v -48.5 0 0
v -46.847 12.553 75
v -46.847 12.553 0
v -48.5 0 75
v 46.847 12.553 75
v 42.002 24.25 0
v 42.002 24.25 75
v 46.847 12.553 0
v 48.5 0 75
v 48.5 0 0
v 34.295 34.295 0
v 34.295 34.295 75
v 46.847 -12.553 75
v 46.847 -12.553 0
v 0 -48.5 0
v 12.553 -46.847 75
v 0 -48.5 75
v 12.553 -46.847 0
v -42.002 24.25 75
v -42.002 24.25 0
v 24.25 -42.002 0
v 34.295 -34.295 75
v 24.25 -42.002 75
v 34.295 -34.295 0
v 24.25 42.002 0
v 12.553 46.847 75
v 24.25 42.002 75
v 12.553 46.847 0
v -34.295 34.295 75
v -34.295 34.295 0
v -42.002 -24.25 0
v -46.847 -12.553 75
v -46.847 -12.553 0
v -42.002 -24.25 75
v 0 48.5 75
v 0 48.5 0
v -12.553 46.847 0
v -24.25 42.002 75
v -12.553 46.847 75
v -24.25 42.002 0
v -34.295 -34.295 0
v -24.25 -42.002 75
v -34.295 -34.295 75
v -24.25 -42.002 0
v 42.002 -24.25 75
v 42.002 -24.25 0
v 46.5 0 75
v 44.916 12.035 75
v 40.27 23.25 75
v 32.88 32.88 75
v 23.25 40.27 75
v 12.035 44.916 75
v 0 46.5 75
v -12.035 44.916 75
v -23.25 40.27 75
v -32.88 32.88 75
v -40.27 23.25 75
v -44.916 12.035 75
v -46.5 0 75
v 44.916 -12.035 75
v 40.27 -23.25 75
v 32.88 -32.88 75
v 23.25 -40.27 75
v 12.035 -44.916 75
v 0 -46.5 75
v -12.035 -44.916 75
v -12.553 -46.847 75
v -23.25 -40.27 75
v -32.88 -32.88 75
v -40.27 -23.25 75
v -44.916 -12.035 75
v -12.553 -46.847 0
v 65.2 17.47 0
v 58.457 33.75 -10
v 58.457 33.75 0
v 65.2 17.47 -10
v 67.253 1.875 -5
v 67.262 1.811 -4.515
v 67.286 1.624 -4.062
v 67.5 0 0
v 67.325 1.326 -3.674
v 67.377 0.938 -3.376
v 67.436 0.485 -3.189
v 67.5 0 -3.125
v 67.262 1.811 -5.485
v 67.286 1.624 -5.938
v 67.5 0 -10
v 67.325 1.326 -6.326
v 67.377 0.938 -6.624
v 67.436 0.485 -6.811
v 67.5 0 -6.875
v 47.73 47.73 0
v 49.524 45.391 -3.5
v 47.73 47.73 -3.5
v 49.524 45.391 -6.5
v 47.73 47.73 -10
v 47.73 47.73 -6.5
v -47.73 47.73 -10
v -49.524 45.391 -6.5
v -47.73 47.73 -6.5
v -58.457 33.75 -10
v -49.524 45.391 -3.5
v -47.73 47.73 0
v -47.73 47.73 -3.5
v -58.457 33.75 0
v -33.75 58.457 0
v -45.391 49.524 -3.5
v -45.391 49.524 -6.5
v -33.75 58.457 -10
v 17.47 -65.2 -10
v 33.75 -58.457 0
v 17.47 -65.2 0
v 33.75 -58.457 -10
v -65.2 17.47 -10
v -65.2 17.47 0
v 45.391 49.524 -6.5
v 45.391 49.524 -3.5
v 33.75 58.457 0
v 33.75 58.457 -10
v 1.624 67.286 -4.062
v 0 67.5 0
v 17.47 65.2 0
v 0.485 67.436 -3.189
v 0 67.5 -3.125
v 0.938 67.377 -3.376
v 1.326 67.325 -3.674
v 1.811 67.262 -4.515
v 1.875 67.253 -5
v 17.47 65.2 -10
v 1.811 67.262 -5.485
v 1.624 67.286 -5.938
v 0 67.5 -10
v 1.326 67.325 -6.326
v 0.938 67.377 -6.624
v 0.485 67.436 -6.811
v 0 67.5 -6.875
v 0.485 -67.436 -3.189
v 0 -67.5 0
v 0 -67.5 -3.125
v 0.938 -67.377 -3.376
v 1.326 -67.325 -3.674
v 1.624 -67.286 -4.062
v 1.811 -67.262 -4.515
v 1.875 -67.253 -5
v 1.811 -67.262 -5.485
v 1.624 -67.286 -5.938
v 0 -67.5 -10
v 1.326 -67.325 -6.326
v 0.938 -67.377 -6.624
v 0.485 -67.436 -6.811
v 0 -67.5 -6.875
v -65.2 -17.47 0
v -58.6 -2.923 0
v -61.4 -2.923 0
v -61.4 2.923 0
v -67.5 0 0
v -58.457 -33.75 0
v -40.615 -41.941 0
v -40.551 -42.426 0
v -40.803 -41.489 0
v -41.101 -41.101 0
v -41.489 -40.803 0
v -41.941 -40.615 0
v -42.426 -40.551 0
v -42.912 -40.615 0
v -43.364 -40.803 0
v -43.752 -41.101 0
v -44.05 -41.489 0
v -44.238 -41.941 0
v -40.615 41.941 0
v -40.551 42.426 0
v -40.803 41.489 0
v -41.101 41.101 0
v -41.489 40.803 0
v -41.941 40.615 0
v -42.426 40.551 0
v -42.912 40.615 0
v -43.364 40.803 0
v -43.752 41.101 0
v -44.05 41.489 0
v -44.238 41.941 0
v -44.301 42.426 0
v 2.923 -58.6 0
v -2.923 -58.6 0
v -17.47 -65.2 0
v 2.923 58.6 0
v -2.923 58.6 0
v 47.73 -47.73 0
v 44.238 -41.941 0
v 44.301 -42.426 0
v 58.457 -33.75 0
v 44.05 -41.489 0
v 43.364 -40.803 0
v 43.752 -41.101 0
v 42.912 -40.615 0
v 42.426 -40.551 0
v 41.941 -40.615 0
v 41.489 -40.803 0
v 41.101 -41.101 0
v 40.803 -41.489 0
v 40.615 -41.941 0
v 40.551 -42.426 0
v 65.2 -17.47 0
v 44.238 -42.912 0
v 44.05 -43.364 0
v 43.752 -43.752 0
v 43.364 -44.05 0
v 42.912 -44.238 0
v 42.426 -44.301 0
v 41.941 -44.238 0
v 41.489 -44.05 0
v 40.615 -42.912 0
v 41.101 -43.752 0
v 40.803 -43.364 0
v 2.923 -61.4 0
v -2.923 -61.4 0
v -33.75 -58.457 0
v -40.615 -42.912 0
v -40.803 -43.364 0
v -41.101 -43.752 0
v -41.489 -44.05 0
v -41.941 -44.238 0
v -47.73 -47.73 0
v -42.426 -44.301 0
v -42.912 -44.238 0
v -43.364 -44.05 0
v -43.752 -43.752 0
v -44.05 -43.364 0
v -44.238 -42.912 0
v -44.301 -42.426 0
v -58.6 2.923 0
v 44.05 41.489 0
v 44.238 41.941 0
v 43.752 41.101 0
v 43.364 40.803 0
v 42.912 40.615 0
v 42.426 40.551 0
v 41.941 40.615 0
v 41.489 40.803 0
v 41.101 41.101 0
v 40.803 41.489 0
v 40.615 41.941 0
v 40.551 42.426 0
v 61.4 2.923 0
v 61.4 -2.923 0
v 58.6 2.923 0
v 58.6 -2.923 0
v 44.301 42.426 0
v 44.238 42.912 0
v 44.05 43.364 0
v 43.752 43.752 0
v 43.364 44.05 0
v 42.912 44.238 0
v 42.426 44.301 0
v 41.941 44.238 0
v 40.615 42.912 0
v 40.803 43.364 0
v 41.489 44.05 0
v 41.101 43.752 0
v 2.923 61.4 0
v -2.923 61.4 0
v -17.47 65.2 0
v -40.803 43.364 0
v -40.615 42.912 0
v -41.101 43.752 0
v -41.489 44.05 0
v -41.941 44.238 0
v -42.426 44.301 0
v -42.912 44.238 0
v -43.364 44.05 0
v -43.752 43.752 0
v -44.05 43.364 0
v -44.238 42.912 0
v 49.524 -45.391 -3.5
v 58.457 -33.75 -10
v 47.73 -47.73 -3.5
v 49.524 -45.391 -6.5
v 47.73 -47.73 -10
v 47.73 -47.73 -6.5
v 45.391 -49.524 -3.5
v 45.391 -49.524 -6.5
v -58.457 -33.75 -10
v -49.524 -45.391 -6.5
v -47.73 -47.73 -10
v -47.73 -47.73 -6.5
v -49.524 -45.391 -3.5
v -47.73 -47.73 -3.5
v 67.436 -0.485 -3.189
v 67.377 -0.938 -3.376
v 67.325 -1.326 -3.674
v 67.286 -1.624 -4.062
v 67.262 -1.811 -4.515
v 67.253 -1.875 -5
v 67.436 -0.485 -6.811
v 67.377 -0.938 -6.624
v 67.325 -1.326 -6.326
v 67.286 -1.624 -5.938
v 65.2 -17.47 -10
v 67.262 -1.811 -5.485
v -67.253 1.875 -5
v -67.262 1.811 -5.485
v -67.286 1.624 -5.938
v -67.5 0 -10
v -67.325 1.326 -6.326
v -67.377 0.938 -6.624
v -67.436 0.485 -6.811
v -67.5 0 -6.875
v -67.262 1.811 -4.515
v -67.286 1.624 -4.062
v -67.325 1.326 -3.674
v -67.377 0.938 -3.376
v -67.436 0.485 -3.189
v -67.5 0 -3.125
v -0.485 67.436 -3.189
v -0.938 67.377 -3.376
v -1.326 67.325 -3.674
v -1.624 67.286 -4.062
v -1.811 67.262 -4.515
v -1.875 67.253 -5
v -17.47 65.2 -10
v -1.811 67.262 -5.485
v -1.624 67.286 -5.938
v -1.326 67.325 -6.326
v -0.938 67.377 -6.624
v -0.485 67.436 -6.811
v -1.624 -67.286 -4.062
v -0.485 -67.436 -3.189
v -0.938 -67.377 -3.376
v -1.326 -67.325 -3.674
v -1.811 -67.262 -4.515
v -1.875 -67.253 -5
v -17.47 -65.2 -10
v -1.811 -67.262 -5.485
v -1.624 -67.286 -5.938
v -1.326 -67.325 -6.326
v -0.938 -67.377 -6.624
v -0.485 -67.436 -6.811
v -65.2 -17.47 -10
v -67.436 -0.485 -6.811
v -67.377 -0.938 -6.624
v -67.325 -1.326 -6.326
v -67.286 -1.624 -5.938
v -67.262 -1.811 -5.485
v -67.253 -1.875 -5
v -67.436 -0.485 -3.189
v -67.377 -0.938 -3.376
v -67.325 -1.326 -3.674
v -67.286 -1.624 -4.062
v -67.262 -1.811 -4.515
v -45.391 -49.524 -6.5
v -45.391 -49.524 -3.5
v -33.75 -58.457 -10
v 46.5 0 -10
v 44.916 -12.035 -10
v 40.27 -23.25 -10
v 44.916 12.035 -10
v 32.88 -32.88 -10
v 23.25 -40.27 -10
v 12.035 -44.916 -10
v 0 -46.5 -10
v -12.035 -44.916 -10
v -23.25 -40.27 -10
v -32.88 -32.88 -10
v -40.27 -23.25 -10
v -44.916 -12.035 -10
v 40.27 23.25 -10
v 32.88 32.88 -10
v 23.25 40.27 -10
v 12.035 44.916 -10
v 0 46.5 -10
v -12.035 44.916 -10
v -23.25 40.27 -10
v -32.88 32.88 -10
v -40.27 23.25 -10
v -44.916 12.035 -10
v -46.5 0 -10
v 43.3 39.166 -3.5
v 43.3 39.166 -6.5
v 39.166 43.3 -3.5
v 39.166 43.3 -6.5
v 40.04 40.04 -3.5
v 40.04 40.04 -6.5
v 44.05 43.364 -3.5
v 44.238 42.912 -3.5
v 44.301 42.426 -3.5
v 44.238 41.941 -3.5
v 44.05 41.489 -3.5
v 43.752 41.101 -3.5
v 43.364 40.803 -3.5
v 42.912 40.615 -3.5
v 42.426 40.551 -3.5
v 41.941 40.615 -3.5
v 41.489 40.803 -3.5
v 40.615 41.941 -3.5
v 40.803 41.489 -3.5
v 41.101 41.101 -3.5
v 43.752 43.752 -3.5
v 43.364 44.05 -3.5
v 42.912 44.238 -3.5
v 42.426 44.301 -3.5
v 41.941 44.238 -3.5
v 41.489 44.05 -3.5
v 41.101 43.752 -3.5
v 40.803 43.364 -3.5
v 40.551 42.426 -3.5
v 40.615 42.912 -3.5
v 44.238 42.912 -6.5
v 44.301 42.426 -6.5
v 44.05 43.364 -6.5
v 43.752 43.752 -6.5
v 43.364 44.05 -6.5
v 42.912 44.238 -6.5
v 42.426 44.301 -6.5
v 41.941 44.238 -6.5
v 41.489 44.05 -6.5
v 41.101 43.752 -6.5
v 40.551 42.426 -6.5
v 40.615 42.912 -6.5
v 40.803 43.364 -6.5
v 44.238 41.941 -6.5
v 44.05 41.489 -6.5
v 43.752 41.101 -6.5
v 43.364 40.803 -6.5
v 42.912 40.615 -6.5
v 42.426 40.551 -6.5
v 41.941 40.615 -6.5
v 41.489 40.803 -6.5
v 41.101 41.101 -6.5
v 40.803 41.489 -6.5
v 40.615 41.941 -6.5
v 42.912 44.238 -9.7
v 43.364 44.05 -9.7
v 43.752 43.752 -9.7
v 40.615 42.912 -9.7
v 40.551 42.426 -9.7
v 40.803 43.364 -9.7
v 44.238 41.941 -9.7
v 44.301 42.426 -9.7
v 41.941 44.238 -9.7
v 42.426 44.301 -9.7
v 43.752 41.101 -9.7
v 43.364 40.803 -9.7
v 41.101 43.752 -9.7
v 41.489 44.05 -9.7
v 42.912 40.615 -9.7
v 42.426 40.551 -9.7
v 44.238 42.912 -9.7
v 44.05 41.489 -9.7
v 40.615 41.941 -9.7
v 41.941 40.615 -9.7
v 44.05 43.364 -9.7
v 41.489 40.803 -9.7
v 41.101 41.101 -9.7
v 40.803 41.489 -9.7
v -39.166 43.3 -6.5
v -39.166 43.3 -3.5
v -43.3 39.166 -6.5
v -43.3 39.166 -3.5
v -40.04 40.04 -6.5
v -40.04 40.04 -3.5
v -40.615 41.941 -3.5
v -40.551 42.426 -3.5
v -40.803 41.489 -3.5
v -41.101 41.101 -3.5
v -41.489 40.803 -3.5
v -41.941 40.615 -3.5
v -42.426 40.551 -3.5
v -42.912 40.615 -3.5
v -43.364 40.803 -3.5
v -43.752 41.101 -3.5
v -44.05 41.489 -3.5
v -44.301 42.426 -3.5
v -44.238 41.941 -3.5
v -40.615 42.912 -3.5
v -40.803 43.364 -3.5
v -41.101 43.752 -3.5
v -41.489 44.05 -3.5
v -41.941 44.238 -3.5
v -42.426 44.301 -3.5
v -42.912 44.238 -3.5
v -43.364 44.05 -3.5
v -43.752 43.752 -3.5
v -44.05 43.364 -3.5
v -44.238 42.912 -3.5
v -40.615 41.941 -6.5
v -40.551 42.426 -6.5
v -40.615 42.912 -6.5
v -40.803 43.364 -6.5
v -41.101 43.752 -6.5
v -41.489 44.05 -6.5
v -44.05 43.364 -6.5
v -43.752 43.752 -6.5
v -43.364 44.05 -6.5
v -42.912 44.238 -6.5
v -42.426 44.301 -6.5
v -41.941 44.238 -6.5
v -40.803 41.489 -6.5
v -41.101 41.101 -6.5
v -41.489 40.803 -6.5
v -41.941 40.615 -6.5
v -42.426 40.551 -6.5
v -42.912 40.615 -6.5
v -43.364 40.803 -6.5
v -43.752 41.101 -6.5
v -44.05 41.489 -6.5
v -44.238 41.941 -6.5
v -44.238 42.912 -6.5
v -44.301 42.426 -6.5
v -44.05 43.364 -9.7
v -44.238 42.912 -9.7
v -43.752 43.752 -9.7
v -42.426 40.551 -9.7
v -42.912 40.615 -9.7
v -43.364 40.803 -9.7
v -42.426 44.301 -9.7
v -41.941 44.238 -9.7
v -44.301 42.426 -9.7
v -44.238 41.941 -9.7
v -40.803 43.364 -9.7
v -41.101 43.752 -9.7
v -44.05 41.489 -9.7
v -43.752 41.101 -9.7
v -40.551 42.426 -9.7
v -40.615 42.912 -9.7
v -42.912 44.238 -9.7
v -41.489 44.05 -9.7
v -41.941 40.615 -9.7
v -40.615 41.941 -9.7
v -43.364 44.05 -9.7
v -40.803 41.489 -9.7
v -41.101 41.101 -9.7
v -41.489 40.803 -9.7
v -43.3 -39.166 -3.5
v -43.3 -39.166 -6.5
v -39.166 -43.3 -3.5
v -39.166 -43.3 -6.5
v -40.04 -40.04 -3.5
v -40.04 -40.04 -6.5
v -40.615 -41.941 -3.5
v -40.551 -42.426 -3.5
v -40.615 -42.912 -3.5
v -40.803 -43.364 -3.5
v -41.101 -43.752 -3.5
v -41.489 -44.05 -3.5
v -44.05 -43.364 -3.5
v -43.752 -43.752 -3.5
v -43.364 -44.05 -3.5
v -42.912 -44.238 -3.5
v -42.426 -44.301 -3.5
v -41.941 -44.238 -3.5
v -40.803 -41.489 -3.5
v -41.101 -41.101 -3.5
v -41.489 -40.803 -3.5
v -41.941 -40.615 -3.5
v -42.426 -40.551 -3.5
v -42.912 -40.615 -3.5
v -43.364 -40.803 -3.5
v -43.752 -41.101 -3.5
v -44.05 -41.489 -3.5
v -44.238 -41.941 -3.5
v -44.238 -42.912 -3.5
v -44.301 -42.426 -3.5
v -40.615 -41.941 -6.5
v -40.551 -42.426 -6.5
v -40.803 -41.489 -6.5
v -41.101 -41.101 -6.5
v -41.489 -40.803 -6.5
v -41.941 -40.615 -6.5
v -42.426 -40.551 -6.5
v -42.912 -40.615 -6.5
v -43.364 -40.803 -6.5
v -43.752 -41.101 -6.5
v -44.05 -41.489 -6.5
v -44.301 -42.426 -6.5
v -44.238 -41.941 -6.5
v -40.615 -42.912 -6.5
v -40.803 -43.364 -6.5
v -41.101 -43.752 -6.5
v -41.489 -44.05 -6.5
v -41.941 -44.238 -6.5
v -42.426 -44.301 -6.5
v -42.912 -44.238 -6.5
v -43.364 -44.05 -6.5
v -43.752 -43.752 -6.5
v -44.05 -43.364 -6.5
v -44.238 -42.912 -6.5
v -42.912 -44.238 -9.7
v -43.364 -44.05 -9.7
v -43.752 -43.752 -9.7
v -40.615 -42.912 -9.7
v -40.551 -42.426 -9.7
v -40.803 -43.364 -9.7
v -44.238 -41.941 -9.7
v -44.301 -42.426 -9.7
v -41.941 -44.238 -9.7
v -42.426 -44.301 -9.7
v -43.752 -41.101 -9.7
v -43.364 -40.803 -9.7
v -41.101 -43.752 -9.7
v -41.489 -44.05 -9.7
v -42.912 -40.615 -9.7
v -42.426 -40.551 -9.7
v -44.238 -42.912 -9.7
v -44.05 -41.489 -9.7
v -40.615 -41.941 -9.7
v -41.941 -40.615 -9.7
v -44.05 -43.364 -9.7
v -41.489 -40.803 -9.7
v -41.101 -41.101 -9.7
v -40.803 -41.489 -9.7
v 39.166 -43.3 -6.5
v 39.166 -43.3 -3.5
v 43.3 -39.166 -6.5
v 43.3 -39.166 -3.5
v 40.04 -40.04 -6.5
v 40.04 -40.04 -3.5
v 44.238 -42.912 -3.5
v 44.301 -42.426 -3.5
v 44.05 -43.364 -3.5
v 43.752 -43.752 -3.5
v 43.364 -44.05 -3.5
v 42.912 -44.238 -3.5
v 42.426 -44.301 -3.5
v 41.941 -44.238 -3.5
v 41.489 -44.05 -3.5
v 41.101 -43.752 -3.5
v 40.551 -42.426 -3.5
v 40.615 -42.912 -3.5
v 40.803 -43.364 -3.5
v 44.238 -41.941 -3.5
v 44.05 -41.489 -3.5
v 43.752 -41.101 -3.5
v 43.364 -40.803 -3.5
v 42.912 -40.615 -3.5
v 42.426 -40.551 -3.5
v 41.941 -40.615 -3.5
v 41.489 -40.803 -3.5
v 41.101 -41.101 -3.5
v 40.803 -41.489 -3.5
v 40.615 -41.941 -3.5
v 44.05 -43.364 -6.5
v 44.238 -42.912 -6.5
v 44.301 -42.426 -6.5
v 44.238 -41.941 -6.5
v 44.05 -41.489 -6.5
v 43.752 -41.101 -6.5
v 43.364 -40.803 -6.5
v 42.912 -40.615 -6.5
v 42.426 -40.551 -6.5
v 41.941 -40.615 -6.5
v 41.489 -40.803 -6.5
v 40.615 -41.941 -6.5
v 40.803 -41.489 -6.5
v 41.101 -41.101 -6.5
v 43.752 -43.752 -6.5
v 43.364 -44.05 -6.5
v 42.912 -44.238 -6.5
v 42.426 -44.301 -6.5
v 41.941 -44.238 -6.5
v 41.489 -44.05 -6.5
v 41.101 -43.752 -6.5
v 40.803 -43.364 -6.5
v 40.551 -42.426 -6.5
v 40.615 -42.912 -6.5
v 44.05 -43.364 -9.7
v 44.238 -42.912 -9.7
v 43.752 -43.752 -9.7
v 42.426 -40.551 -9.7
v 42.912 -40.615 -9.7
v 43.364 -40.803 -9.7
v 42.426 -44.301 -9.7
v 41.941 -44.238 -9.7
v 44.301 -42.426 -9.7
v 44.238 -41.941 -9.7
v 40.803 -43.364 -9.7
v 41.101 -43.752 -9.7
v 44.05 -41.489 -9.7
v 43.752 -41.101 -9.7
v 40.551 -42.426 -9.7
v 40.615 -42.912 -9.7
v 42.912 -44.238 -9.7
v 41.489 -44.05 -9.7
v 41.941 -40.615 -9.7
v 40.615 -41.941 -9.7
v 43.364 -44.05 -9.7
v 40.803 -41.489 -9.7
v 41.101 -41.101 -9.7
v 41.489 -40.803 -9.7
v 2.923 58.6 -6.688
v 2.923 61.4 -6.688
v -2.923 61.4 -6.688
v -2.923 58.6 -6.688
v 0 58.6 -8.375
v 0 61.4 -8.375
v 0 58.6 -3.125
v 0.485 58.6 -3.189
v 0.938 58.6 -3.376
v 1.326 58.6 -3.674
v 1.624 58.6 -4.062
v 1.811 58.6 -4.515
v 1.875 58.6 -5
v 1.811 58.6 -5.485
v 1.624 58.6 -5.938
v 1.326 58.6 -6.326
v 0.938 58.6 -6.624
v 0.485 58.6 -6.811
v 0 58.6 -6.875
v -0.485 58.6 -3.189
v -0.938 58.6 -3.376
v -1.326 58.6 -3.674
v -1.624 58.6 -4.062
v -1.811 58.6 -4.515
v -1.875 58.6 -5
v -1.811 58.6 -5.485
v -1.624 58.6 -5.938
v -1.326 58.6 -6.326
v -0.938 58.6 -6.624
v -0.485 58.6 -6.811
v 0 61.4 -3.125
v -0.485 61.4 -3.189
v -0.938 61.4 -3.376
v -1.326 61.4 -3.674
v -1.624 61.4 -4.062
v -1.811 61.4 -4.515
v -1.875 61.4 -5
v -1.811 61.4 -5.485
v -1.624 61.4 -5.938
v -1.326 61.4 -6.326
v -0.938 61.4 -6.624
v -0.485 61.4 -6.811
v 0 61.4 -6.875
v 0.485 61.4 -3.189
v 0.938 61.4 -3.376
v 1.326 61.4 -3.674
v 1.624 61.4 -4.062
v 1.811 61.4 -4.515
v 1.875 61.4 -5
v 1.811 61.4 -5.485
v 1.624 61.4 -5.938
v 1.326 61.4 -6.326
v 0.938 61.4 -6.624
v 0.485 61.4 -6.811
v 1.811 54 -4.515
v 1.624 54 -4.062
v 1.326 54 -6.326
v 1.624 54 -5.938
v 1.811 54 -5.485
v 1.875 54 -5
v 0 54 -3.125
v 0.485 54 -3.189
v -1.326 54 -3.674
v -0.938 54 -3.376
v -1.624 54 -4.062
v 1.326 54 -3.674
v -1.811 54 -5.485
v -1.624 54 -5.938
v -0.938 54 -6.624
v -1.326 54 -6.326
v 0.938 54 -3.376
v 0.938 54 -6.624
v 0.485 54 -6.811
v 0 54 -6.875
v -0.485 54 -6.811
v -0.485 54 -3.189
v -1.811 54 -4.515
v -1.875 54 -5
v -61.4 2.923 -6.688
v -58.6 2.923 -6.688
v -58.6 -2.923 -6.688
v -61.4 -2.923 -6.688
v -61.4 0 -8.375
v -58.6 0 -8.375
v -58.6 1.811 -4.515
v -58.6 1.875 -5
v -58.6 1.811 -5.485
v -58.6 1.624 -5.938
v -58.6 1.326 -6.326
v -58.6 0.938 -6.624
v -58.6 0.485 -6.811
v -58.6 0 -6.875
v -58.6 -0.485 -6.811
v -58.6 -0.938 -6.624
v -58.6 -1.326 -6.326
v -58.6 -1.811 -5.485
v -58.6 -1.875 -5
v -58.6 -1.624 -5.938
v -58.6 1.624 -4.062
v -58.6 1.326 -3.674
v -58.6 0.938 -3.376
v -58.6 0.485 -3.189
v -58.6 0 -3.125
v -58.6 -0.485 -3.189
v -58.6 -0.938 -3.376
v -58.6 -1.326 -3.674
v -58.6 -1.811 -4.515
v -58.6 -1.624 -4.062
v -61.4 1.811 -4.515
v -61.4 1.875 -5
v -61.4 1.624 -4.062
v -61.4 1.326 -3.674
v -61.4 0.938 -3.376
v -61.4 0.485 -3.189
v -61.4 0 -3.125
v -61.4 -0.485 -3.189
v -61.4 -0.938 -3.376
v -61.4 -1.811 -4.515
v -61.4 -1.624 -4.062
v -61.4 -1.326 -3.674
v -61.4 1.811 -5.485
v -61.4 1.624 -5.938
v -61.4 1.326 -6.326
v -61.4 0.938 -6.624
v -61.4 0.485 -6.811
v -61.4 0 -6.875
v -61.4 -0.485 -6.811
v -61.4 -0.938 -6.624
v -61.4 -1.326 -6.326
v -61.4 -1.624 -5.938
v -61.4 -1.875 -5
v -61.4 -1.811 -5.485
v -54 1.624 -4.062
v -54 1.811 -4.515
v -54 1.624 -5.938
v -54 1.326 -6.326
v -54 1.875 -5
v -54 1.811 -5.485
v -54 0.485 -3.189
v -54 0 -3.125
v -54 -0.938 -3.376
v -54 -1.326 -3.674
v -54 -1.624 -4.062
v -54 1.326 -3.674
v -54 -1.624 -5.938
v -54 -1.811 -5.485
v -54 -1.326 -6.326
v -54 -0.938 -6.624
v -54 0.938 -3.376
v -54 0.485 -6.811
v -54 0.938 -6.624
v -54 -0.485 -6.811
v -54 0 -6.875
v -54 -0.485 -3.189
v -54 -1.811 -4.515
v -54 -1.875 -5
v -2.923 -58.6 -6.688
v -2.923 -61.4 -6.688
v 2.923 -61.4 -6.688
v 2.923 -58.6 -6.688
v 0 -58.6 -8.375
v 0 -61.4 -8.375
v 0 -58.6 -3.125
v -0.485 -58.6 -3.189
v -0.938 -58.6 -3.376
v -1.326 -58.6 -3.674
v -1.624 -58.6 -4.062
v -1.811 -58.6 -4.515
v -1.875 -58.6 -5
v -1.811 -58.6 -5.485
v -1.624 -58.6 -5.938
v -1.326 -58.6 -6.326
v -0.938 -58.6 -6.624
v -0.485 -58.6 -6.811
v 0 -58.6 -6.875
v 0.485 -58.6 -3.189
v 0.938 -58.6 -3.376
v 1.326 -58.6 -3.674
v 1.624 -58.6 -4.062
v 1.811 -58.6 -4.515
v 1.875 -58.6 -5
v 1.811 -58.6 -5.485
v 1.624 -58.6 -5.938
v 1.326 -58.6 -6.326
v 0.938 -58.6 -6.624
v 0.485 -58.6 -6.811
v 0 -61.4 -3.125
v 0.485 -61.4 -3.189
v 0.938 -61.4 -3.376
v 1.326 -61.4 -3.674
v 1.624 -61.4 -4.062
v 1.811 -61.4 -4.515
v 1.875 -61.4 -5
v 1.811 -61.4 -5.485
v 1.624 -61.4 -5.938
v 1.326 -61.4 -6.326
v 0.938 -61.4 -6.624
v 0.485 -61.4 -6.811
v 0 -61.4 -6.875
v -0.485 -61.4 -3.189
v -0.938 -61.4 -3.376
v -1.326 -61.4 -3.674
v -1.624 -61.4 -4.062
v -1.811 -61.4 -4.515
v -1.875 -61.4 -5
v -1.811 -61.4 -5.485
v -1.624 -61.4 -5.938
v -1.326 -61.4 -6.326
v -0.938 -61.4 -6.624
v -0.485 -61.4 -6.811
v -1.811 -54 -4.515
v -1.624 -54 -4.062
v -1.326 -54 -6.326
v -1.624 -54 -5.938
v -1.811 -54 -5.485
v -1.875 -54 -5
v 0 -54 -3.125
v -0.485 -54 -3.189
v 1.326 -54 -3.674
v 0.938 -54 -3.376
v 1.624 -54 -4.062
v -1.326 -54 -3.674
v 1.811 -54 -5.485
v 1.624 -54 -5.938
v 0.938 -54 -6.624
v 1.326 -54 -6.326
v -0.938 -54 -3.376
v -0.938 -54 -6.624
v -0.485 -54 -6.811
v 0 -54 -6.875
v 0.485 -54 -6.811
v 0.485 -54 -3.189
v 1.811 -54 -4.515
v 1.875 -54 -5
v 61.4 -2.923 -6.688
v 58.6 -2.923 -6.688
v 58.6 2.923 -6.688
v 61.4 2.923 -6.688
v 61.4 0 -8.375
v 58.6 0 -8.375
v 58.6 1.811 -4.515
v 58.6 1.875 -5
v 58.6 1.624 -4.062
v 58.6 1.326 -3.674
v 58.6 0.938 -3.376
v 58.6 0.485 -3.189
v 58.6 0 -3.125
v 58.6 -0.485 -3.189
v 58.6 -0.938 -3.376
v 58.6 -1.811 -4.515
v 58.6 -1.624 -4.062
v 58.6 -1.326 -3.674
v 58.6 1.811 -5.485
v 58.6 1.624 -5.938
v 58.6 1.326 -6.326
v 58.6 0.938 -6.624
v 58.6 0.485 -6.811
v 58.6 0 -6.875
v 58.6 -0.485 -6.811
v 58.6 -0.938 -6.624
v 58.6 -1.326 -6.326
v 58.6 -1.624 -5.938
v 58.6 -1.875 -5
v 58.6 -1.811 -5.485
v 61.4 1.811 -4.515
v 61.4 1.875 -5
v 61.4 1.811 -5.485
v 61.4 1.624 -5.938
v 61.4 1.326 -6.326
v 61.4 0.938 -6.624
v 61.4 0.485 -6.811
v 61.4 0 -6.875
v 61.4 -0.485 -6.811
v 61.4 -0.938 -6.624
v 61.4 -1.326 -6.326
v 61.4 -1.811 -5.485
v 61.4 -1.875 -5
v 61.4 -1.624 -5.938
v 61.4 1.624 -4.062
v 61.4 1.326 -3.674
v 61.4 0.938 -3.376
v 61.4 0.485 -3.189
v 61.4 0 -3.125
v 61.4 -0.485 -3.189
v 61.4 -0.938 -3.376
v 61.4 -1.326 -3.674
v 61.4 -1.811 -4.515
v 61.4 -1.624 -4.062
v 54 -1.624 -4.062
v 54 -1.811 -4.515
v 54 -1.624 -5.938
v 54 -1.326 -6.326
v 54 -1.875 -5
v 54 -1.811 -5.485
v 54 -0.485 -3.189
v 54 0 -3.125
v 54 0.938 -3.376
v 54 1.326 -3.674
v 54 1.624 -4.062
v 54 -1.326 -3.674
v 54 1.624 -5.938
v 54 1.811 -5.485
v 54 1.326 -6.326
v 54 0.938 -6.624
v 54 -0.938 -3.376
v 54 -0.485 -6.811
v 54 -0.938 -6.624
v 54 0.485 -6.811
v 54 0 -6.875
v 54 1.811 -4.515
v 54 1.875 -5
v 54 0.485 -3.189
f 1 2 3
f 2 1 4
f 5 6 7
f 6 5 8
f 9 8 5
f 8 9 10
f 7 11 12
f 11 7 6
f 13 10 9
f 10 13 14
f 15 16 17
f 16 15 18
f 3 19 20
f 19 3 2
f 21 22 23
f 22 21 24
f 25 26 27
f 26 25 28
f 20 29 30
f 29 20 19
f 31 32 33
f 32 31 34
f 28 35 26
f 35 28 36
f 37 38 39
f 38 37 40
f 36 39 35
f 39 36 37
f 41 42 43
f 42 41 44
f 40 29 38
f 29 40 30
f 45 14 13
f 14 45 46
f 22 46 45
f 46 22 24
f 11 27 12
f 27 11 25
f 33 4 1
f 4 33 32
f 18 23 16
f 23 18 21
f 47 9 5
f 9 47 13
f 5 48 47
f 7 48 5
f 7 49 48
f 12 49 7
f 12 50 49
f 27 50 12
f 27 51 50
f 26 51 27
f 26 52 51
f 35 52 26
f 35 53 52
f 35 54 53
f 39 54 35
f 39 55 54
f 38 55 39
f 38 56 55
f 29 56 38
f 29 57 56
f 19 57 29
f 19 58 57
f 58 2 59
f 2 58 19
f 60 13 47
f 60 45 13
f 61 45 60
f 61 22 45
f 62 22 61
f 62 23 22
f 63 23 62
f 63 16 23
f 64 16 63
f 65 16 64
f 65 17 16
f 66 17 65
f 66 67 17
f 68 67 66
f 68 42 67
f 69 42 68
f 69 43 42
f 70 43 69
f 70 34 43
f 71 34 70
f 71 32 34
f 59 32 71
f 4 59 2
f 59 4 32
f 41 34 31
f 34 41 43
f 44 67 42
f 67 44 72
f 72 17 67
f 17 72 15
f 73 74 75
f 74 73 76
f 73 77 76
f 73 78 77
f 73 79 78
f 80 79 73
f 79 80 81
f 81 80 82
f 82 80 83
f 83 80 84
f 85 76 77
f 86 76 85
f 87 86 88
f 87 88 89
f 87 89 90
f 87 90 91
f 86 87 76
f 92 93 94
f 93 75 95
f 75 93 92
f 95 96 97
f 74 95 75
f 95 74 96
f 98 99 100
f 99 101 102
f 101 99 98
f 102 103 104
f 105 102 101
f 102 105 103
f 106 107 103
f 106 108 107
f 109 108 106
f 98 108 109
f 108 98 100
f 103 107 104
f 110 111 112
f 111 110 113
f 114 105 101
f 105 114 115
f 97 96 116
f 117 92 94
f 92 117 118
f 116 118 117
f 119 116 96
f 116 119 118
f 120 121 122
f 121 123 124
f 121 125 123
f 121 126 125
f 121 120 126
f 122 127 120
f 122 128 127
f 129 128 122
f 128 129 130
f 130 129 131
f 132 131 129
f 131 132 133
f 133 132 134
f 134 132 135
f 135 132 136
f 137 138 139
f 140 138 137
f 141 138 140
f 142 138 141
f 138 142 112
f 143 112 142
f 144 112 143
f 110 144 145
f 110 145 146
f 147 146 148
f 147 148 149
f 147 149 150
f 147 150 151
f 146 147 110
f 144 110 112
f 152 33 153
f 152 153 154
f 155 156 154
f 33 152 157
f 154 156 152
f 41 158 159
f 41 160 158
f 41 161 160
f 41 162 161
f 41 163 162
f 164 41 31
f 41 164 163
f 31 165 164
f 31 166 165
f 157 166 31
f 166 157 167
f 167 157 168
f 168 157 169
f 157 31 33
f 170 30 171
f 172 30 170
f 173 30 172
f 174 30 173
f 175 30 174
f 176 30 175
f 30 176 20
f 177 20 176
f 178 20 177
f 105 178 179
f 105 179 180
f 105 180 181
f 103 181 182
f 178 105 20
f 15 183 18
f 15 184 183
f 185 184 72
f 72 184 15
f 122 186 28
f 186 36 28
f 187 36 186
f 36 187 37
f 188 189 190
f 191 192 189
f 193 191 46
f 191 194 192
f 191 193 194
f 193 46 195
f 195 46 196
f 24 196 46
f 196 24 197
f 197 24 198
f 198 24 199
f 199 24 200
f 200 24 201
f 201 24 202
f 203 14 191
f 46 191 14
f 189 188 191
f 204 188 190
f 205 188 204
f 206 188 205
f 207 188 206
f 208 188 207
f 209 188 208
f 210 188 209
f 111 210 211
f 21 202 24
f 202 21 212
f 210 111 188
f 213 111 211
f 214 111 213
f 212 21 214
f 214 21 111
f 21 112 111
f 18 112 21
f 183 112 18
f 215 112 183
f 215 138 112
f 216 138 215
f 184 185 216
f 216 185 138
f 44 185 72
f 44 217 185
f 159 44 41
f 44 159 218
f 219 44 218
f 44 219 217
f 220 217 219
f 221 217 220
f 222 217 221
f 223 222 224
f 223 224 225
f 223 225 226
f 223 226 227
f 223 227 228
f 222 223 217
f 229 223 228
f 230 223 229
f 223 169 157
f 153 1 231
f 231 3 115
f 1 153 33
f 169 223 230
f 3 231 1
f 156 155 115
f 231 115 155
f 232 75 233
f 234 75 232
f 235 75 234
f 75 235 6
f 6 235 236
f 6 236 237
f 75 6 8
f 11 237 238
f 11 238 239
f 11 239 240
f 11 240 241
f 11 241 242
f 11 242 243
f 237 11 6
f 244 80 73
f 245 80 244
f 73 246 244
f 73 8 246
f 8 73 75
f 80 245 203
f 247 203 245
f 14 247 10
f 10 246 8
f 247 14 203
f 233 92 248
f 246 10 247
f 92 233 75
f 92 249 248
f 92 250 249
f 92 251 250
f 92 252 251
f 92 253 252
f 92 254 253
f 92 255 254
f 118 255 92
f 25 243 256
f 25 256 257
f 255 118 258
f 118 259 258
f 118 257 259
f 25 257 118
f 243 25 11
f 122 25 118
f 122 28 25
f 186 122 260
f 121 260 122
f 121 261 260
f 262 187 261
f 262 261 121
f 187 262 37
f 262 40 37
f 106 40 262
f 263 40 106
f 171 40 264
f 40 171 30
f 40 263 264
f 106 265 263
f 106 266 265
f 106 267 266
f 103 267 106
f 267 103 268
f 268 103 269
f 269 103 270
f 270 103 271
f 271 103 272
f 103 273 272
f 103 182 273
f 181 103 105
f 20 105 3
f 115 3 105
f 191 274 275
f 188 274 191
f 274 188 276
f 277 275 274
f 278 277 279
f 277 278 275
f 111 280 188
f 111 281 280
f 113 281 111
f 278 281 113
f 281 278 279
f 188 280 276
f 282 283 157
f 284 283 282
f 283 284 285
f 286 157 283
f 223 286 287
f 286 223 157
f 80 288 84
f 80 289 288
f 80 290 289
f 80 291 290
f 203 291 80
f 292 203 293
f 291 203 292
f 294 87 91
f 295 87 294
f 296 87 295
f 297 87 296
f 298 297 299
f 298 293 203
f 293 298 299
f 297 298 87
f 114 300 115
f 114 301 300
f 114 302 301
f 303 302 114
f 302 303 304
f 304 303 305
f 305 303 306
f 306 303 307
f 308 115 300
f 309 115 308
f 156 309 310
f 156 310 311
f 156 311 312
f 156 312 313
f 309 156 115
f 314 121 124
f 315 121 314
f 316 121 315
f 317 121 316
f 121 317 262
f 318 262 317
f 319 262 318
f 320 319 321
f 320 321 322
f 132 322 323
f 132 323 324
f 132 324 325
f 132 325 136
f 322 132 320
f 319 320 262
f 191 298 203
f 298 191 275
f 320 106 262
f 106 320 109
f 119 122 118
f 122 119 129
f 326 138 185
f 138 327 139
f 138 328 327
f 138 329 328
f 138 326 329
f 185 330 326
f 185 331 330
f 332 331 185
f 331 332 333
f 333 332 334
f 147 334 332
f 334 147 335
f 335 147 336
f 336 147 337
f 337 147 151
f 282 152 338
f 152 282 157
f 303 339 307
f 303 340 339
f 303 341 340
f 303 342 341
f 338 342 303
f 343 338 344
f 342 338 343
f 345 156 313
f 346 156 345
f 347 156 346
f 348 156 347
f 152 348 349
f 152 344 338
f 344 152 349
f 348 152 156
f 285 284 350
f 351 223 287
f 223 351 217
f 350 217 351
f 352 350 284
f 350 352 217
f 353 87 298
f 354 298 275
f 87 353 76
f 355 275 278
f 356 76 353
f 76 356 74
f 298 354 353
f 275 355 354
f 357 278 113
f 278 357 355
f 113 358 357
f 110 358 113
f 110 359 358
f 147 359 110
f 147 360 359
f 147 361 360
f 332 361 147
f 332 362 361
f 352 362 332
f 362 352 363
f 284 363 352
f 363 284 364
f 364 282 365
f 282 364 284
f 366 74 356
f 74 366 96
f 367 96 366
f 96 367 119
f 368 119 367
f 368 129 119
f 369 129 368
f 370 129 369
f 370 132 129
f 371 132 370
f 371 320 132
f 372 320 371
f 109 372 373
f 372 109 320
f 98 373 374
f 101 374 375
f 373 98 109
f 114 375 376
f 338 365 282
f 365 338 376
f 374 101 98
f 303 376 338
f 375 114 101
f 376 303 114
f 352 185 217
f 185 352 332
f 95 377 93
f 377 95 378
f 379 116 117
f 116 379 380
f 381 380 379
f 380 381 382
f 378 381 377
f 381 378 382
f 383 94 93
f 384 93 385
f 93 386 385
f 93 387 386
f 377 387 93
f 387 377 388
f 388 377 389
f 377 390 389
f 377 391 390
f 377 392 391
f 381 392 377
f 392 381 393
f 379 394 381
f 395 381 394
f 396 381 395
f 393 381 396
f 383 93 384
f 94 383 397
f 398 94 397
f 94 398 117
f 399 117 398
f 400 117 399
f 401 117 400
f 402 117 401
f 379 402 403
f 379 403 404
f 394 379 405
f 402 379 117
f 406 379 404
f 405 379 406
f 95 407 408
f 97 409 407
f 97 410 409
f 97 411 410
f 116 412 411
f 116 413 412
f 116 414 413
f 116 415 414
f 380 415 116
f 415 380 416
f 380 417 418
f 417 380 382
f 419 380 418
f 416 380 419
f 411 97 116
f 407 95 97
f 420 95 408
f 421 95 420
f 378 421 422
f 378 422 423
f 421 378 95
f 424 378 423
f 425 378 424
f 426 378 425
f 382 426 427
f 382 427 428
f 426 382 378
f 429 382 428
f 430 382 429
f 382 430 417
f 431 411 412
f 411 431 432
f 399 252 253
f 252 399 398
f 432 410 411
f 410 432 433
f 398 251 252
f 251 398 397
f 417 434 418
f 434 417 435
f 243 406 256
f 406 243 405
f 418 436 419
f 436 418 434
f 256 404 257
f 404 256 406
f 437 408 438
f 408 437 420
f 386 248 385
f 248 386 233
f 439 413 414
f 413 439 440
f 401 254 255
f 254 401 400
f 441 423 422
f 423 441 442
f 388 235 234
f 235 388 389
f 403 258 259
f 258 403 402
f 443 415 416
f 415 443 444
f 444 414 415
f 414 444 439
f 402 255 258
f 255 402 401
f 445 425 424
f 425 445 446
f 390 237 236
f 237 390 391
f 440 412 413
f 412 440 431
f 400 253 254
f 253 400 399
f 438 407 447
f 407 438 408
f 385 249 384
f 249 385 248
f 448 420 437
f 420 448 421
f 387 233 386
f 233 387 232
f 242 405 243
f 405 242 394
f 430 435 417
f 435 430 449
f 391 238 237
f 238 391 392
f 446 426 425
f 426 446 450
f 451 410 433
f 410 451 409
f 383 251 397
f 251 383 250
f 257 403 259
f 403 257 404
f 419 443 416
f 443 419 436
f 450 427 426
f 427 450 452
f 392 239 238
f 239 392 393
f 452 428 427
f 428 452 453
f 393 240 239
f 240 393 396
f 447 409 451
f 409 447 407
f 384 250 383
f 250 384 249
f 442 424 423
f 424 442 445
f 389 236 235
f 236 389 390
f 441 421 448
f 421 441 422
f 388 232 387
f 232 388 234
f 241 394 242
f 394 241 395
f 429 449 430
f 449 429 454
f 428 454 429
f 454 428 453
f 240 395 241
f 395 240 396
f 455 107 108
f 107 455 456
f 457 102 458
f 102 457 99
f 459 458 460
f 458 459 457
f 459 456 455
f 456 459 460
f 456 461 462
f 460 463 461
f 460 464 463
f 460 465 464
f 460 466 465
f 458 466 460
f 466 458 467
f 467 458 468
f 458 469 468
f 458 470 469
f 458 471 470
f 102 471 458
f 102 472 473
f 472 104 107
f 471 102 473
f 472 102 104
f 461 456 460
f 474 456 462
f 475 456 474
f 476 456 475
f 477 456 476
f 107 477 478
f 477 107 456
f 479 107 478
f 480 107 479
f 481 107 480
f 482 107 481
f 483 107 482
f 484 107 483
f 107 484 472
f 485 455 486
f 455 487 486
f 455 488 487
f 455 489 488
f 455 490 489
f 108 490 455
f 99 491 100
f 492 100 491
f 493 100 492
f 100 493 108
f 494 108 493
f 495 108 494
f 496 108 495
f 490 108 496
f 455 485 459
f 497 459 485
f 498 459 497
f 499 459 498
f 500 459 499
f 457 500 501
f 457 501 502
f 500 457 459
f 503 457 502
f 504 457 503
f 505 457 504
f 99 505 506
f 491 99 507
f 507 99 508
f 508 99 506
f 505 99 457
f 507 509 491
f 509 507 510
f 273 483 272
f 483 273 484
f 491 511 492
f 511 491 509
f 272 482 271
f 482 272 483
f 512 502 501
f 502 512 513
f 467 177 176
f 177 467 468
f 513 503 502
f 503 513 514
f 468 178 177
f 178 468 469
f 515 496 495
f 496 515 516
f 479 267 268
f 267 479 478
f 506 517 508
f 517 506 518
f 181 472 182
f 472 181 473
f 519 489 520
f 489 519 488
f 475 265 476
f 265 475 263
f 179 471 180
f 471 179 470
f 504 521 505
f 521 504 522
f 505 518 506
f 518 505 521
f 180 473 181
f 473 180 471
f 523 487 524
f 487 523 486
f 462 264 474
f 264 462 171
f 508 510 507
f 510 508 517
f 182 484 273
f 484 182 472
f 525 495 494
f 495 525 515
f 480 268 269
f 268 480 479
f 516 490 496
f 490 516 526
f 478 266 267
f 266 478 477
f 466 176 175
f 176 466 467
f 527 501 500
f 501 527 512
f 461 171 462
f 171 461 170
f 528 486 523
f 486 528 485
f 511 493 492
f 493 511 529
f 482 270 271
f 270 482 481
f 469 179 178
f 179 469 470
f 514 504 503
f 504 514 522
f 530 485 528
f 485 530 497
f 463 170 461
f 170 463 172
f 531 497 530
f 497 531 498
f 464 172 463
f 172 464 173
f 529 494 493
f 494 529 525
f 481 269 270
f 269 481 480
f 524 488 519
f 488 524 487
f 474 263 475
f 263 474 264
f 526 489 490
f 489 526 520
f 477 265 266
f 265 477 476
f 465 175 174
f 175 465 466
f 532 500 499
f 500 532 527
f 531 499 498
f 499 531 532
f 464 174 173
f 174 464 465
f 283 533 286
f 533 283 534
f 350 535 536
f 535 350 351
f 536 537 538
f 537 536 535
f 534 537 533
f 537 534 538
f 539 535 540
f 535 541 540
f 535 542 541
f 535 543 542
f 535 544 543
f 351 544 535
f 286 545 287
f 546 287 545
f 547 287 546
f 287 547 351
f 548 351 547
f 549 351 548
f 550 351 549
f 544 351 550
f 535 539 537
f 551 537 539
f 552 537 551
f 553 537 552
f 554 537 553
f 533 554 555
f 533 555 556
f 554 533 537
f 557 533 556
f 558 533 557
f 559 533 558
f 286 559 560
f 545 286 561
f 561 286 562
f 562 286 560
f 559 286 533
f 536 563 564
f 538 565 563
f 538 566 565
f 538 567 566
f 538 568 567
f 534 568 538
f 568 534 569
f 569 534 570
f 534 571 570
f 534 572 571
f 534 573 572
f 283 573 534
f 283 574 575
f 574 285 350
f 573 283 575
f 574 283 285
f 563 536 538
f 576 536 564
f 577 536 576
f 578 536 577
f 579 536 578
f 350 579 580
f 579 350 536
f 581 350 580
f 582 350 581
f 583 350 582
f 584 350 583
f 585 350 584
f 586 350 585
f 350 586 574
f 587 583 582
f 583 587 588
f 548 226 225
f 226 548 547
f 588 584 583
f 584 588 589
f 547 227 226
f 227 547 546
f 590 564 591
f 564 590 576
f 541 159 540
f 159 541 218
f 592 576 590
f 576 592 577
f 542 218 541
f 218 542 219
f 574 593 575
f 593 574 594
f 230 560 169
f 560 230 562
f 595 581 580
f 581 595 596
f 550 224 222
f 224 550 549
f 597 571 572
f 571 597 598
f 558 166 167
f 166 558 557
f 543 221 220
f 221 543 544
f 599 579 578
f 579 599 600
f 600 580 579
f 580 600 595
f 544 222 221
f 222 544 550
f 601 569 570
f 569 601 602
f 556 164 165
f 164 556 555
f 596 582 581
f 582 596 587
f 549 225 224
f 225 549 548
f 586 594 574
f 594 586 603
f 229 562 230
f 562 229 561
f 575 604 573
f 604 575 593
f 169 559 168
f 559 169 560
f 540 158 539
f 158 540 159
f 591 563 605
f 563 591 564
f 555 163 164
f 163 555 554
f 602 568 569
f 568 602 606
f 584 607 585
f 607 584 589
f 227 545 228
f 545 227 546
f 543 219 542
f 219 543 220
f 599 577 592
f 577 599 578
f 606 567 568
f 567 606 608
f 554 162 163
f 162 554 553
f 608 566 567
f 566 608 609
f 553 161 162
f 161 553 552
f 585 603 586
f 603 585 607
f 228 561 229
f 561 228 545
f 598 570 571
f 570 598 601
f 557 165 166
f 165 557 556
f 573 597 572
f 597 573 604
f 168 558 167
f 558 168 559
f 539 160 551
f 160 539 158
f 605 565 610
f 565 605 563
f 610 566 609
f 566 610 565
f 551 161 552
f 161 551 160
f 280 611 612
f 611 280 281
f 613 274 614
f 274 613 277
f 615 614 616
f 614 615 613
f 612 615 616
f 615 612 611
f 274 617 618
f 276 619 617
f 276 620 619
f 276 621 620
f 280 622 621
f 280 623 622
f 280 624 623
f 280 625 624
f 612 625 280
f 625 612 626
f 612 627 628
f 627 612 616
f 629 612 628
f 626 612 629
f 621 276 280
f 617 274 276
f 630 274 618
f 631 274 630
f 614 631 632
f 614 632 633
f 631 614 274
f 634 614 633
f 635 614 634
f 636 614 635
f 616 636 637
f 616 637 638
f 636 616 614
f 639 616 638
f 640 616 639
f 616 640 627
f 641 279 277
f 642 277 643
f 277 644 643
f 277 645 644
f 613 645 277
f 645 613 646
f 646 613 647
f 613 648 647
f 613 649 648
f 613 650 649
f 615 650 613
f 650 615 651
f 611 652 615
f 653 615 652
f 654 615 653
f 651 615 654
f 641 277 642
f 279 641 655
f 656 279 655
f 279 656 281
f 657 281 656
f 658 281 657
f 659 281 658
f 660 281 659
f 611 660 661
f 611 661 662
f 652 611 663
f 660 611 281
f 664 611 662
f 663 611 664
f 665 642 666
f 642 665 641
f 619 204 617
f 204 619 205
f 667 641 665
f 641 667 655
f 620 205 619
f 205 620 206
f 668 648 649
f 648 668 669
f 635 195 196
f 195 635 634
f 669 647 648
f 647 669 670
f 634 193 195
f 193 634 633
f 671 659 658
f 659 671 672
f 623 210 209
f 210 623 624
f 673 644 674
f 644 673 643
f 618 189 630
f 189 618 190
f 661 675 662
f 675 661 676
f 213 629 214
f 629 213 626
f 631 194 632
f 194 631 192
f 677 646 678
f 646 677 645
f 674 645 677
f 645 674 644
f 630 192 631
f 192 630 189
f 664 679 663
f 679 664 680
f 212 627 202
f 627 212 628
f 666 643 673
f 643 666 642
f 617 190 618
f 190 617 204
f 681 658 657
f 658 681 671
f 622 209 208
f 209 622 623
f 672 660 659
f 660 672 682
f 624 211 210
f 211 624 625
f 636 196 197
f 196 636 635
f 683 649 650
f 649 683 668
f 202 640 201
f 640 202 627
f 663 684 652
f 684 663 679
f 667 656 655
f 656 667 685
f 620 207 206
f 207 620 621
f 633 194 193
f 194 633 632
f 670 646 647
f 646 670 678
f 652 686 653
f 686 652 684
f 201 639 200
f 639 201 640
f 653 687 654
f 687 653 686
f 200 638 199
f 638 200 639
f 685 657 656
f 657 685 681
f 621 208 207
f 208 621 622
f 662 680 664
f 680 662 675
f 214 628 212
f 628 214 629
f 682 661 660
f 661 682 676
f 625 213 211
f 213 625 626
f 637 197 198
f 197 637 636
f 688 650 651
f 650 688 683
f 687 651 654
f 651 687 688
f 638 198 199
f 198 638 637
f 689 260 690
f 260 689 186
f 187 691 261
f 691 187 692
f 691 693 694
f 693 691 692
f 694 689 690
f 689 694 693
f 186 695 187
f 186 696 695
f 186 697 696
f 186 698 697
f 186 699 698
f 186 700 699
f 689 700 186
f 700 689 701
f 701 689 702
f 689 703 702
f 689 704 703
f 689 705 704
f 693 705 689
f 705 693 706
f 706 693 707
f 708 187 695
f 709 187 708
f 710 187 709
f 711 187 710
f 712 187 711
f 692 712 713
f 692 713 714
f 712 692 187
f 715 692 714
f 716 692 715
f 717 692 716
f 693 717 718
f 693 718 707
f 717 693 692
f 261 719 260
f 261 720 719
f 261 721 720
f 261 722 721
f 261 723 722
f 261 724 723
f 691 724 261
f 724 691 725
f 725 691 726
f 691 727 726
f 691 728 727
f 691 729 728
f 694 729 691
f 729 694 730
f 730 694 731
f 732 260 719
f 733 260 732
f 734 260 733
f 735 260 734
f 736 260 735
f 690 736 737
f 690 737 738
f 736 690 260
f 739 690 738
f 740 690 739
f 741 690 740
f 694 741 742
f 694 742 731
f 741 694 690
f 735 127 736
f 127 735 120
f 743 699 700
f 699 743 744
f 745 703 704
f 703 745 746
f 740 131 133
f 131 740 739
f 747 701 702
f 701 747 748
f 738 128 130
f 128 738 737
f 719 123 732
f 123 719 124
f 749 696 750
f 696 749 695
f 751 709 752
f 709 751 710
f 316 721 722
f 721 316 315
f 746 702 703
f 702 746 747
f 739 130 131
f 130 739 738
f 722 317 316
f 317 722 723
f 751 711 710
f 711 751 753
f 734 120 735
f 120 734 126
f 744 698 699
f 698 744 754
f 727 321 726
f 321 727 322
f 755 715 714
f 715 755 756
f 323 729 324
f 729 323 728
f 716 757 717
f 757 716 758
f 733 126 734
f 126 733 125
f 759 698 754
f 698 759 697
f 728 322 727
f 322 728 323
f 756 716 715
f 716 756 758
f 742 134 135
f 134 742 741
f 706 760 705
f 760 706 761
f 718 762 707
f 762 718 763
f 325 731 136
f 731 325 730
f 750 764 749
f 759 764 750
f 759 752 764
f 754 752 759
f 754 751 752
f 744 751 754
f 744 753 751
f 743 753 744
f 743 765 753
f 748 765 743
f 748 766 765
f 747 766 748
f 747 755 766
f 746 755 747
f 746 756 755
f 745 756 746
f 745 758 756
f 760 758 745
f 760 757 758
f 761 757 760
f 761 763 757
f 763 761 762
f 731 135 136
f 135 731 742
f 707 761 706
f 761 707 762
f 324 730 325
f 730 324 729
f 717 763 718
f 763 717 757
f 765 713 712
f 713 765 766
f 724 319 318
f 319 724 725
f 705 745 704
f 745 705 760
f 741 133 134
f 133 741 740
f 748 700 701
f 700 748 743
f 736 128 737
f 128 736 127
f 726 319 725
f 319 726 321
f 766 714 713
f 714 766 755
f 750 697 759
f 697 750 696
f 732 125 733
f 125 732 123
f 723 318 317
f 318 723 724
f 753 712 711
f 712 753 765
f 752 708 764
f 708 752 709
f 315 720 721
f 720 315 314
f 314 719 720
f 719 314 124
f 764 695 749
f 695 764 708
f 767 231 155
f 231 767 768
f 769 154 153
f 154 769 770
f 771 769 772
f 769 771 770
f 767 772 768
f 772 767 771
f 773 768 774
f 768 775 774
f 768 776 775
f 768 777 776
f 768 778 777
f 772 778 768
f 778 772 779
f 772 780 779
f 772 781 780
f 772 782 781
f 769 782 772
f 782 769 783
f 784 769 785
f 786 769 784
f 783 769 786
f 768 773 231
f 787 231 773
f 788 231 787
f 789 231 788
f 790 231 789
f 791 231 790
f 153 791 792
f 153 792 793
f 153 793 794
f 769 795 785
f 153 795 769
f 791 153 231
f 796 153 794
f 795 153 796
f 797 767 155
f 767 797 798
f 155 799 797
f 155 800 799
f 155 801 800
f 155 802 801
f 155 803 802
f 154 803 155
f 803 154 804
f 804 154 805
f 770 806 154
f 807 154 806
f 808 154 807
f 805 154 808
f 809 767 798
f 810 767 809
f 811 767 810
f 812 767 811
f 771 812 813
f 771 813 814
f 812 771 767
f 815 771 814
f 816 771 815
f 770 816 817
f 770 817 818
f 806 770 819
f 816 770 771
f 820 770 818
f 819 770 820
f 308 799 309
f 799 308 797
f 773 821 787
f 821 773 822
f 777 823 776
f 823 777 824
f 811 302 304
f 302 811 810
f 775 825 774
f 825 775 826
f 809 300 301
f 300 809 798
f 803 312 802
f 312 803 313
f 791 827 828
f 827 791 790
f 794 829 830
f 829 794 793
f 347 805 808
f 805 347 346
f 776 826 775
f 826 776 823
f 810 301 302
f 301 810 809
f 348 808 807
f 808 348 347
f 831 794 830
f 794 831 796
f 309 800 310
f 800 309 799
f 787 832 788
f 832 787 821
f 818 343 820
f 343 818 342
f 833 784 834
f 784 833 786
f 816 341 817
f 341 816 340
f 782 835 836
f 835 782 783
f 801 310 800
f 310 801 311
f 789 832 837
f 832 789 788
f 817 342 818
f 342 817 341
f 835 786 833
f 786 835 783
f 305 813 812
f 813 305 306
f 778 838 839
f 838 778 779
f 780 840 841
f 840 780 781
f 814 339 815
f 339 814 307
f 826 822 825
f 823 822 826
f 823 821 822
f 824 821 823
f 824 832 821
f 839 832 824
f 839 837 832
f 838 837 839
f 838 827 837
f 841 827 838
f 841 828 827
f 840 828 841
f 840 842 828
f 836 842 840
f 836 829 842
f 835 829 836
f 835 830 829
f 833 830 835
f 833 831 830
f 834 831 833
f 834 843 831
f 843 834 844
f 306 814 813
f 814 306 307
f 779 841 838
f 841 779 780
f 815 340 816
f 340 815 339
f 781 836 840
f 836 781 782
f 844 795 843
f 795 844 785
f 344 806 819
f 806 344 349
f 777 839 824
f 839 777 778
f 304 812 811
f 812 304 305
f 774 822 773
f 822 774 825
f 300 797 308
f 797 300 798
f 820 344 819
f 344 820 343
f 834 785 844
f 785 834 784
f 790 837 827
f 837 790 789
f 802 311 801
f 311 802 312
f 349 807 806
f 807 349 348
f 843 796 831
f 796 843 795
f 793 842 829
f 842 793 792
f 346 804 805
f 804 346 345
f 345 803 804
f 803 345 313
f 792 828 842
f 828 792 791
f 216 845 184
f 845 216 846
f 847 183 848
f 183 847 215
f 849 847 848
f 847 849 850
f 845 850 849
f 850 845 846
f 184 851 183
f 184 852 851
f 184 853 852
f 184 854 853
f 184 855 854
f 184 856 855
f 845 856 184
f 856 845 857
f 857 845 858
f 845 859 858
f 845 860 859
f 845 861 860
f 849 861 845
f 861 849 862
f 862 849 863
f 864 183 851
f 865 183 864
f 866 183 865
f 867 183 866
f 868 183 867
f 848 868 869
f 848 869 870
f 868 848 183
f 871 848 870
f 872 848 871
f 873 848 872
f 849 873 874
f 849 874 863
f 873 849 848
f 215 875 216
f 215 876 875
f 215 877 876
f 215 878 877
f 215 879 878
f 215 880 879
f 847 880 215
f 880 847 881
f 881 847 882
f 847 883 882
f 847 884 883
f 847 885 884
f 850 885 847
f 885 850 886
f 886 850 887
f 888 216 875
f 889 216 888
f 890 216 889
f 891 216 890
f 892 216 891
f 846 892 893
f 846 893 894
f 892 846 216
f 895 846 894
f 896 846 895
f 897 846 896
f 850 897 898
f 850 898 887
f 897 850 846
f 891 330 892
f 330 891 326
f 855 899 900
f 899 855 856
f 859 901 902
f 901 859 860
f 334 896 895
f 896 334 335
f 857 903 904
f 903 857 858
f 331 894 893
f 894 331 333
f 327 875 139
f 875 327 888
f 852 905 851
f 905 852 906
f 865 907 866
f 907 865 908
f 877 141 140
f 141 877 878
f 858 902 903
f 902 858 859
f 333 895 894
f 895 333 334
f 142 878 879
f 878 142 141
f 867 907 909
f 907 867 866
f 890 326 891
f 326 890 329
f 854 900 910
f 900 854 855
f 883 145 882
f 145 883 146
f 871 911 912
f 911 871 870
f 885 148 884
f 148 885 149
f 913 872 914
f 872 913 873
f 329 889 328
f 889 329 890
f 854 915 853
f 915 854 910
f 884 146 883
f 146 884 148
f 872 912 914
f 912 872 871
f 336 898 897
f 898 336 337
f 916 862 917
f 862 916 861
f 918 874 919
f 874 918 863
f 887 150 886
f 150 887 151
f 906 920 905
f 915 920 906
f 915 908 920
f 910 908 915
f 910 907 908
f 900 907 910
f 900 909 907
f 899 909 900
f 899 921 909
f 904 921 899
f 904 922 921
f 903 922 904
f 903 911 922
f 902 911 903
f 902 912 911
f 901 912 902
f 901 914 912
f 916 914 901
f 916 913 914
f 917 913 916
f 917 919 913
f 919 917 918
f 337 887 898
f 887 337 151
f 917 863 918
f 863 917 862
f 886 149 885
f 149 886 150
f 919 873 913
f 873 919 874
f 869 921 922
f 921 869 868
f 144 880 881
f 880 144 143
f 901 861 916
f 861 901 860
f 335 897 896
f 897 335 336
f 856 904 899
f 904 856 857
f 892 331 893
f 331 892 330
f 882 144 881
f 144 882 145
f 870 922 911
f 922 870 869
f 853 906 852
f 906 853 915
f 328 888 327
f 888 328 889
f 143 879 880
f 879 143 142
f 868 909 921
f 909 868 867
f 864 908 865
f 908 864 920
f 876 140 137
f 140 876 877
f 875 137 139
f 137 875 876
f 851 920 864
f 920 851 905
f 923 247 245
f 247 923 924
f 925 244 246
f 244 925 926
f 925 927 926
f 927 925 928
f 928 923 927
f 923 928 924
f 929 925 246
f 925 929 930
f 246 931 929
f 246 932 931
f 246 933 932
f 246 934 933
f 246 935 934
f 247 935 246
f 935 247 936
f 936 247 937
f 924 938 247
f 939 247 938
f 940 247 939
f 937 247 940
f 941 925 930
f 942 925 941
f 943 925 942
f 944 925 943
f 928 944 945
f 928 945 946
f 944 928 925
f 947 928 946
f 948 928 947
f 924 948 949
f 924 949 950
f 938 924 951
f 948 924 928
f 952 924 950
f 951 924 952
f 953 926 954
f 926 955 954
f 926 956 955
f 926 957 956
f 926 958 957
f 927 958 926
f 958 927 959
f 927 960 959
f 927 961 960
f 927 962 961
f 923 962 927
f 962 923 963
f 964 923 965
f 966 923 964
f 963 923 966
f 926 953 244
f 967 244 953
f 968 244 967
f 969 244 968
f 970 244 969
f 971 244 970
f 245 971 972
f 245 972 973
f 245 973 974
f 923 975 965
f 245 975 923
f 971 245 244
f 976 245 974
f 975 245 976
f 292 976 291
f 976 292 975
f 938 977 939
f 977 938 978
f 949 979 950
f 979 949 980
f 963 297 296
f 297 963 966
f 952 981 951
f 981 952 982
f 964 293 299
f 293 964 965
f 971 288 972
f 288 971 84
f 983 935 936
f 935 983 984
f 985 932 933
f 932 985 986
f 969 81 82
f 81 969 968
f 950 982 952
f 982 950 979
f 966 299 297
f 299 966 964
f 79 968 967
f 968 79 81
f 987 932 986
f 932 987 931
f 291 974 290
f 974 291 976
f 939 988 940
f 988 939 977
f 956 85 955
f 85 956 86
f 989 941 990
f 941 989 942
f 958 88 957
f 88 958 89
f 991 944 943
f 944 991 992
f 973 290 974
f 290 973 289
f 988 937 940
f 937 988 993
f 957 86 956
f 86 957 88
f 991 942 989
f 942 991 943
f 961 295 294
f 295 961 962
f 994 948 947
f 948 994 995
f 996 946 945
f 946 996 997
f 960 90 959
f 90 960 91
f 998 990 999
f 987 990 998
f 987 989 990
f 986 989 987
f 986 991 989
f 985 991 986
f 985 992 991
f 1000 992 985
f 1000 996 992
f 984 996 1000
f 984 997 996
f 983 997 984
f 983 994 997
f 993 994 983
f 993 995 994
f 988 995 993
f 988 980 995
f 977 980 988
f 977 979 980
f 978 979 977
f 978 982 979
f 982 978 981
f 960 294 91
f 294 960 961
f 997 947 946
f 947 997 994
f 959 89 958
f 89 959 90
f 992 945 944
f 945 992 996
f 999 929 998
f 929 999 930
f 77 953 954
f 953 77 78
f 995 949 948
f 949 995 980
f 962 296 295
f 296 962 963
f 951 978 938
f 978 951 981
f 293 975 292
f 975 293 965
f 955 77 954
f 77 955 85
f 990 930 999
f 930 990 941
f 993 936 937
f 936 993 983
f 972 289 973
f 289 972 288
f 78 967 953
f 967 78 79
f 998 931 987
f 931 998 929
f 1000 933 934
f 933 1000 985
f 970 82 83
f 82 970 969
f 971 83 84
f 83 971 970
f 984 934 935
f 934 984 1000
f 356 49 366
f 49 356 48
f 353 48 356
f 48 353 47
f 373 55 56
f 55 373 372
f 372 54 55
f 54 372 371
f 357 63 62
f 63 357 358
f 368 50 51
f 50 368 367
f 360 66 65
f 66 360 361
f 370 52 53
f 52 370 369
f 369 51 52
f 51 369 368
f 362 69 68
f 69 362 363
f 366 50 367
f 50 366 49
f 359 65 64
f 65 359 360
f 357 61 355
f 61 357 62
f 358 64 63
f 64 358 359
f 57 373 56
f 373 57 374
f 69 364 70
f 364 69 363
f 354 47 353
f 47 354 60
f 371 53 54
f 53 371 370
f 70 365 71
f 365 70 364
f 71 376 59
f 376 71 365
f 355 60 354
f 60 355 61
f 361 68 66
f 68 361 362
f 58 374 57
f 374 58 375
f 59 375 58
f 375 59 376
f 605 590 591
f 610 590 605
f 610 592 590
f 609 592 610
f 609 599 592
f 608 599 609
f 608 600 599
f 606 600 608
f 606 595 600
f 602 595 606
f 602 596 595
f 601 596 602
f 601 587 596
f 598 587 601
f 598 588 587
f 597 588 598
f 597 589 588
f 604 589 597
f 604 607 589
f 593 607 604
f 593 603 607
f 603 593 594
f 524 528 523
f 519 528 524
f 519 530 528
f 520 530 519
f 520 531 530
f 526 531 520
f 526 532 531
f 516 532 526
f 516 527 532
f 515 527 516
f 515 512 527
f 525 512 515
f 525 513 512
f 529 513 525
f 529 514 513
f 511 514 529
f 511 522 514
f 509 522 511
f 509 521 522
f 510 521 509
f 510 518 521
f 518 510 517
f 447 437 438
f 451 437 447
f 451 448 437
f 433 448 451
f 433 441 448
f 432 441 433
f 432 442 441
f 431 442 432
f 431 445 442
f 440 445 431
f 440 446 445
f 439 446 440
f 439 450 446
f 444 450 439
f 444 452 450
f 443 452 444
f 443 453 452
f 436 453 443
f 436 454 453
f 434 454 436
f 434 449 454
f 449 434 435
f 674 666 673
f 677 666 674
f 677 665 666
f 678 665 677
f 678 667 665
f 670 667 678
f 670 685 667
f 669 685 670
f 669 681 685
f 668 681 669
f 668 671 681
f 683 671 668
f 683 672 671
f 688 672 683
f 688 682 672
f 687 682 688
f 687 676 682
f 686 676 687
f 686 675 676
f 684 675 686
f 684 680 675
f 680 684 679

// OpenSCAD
module HNutPocket
(
	nutDiam=6.75,
	nutHeight=2.6,
	pocketLen=10,
)
{
	m=(nutDiam/2)*sqrt(3)/2;
	union()
	{
		cylinder(d=nutDiam,h=nutHeight,center=true,$fn=6);
		translate([pocketLen/2,0,0])
		cube(size=[pocketLen,m*2,nutHeight],center=true);
	}
}

module VNutPocket
(
	nutDiam=6.5,
	nutHeight=2.6,
	pocketLen=10,
)
{
	m=(nutDiam/2)*sqrt(3)/2;
	rotate(a=90,v=[0,0,1])
		rotate(a=90,v=[0,-1,0])
			union()
			{
				cylinder(d=nutDiam,h=nutHeight,center=true,$fn=6);
				translate([pocketLen/2,0,0])
				cube(size=[pocketLen,m*2,nutHeight],center=true);
			}
}

module WallTube
(
	intHolesDiam=3.75,
	extDiam=135,
	extHeight=10,
	intDiam=97,
	intHeight=75,
	wallSize=2,
	nutDiam=6.75,
	horNutHeight=3,
	vertNutHeight=2.8,
	vertClipsDiam=120,
	horClipsExtDepth=6,
	quality=2,
)
{
	cutClr=0.1;
	union()
	{
	difference()
	{
		union()
		{
			translate([0,0,-cutClr])
				cylinder(d=intDiam, h=intHeight+cutClr,$fn=12*quality);
			translate([0,0,-extHeight])
				cylinder(d=extDiam, h=extHeight,$fn=12*quality);
		}
		translate([0,0,-extHeight-cutClr])	
			cylinder(d=intDiam-wallSize*2, h=intHeight+extHeight+2*cutClr,$fn=12*quality);

		for (i=[0:3])
			rotate(a=90*i+45,v=[0,0,1])
				translate([vertClipsDiam/2,0,-extHeight/2])
				{
					HNutPocket(nutDiam=nutDiam,nutHeight=horNutHeight,pocketLen=(extDiam-vertClipsDiam));
					cylinder(d=intHolesDiam,h=extHeight+cutClr*2,center=true,$fn=12*quality);
				}
		for (i=[0:3])
			rotate(a=90*i,v=[0,0,1])
				translate([0,vertClipsDiam/2,-extHeight/2])
				{
					VNutPocket(nutDiam=nutDiam,nutHeight=vertNutHeight,pocketLen=extHeight/2+cutClr);
					translate([0,-horClipsExtDepth,0])
						rotate(a=-90,v=[1,0,0])
							cylinder(d=intHolesDiam,h=(extDiam-vertClipsDiam)+horClipsExtDepth,$fn=12*quality);
				}
	}

	difference()
	{
		translate([0,0,-extHeight])
			cylinder(d=extDiam, h=0.3,$fn=12*quality);
		translate([0,0,-extHeight-cutClr])
			cylinder(d=intDiam-wallSize*2, h=0.3+2*cutClr,$fn=12*quality);
	}

	}
}

WallTube();
